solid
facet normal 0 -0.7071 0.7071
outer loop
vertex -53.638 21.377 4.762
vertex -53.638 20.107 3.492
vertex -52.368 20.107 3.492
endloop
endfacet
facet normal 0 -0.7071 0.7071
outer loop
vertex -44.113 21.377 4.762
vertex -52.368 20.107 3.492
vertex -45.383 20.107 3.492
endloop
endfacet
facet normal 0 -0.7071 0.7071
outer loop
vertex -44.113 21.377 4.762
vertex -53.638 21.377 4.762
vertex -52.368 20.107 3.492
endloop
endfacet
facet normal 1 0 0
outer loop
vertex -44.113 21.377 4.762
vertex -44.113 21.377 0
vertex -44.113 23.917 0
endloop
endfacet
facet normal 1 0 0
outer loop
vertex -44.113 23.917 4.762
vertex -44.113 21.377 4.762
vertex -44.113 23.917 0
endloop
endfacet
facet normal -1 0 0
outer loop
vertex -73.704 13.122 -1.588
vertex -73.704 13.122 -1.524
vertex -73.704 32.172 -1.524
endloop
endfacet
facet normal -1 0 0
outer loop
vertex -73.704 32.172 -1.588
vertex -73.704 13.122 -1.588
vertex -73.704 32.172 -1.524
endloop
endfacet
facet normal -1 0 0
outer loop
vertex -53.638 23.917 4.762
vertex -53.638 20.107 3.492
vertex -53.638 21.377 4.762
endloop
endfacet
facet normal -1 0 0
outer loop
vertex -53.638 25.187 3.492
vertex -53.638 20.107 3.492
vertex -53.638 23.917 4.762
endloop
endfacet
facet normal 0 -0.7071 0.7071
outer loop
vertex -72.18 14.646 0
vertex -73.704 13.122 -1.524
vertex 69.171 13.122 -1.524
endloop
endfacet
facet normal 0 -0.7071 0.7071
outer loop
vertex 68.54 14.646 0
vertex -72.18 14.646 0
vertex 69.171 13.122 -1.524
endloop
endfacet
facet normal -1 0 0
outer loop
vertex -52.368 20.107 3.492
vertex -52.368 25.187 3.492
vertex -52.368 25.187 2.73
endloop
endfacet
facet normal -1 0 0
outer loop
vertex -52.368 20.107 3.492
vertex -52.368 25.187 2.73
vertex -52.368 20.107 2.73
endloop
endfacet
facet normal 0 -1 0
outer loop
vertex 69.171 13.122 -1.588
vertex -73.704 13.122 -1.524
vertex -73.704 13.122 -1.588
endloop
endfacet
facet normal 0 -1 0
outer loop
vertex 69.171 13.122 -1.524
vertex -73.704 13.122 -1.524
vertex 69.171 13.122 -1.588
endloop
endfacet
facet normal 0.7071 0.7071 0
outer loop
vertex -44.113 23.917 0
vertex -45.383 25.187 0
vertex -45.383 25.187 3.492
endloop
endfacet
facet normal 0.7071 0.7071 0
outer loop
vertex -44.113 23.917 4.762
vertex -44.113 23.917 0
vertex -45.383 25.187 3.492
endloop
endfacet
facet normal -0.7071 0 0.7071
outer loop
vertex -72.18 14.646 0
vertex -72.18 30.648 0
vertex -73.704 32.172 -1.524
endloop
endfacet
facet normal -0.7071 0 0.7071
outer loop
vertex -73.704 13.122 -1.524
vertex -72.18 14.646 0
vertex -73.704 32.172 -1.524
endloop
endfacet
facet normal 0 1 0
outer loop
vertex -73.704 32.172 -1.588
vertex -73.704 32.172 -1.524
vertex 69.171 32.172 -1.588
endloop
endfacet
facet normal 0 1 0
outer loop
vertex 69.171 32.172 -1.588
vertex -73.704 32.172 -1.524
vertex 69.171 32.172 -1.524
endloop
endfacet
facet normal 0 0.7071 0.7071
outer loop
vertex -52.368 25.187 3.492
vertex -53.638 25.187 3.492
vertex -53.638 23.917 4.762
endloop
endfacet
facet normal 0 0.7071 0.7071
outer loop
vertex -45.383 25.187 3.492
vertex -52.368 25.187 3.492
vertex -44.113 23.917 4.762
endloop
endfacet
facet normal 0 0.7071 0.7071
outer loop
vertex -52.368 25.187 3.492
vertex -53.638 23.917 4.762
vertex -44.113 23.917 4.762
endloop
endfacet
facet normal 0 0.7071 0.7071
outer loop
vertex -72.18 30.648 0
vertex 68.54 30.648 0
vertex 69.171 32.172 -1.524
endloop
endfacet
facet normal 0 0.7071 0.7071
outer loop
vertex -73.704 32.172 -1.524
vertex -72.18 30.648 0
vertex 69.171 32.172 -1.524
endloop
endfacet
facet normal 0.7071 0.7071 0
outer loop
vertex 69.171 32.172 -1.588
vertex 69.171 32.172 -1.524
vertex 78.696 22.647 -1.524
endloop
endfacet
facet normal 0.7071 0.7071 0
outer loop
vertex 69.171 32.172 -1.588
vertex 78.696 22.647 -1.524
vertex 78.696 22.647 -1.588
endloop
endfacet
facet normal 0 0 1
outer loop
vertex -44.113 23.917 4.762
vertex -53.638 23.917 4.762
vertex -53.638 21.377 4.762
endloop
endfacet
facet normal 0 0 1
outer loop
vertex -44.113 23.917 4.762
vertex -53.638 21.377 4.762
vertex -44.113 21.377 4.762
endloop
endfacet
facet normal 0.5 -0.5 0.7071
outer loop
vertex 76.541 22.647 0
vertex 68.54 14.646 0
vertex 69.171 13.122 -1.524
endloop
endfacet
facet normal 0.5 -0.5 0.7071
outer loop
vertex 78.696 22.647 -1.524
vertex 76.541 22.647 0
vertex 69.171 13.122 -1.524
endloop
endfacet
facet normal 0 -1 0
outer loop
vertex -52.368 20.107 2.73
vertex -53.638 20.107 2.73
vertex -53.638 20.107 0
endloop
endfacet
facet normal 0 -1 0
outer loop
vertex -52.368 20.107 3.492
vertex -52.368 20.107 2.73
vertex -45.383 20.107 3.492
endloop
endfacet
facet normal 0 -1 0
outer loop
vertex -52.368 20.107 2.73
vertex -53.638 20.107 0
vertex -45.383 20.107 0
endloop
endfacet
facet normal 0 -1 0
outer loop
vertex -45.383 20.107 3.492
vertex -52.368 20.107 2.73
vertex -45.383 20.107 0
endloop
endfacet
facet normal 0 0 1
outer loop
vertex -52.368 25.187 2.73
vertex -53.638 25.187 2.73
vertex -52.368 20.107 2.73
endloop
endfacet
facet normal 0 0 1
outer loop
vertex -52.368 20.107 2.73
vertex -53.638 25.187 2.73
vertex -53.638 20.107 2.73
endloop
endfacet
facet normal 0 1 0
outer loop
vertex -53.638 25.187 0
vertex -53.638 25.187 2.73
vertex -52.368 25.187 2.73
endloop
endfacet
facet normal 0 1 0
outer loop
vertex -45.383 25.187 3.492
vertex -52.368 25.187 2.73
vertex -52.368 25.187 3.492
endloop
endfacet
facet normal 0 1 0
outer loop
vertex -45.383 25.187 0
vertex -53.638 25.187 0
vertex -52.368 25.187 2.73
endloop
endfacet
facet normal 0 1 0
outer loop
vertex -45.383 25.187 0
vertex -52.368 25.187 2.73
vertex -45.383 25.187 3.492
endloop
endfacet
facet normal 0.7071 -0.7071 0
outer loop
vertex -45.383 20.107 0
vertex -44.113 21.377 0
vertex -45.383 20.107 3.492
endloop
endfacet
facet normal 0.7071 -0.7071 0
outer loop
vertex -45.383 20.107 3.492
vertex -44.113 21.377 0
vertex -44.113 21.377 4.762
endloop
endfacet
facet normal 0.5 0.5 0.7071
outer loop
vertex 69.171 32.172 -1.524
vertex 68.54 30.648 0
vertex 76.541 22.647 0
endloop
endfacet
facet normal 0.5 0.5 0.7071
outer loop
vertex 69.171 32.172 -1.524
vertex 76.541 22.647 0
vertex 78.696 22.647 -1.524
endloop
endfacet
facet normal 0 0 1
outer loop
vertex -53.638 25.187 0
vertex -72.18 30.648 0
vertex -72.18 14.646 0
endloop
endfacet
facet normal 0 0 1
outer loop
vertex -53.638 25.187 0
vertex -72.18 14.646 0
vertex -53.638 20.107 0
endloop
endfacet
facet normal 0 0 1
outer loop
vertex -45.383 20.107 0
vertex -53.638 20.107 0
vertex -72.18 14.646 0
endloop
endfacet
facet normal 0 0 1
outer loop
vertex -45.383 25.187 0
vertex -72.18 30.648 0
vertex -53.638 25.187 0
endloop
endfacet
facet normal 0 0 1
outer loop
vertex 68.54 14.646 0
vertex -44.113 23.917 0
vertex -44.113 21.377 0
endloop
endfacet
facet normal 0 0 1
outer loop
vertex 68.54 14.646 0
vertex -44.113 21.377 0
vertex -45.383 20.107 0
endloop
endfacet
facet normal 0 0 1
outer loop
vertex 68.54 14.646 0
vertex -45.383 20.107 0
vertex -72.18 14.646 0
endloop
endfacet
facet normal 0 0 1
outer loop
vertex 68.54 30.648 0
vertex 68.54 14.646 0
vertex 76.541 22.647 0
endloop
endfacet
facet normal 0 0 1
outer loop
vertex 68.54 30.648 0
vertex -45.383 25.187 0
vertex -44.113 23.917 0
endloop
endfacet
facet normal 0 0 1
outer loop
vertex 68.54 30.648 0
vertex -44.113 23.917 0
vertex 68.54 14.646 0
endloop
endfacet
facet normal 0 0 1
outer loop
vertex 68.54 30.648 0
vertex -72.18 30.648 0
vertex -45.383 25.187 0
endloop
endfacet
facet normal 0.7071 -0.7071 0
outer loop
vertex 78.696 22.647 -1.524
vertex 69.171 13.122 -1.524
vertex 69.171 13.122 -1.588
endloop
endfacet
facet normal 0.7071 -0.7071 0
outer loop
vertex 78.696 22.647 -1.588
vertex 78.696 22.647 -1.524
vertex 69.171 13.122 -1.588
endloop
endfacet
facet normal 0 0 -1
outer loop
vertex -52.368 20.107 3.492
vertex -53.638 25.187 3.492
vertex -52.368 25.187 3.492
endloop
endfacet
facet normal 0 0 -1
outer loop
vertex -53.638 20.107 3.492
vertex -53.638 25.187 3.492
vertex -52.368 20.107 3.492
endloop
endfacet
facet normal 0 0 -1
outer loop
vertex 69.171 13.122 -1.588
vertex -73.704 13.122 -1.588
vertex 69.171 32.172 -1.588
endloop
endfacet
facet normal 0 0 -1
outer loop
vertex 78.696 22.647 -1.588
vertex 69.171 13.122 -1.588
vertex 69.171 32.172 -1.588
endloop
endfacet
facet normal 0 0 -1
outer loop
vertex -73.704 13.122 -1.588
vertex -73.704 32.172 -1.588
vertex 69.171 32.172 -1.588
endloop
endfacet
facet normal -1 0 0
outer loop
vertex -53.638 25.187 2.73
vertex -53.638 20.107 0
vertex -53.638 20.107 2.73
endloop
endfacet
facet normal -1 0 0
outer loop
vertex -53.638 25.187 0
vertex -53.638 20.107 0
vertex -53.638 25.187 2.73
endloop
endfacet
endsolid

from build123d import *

# Parameters (mm, degrees)
F0_W         = 152.4
F0_H         = 19.05
F1_DEPTH     = 1.5875
F2_SIZE      = 9.52499
F3_W         = 9.525
F3_H         = 5.08
F4_DEPTH     = 4.7625
F5_SIZE      = 1.27
F6_W         = 5.08
F6_H         = 0.762
F7_DEPTH     = 1.27
F8_SIZE      = 1.524
F9_T1_DEPTH  = 19.1535983177
F9_T3_DEPTH  = 7.8385097473
F9_T5_DEPTH  = 21.3088597868
F9_T7_DEPTH  = 150.7134997473
F9_T9_DEPTH  = 25.3644897473
F9_T14_DEPTH = 9.4899593576
F9_T19_DEPTH = 9.4899593576
F9_T24_DEPTH = 9.4899593576
F9_T29_DEPTH = 9.4899593576


# Not quite as in the source:
# - a fillet or chamfer that OpenCascade refuses, or shapes differently, is made with other operations: its cross-section is extruded or revolved along the edge and cut away or added
# - two fillets or chamfers of one size are made in one step
# - a fillet or chamfer is up to 0.001 mm smaller than in the source, because OpenCascade refuses the exact size


with BuildPart() as f1:
    # F0 (on Top) → F1 (new body)
    with BuildSketch(Plane.XY):
        with Locations((2.4961568415, 22.6473969003)):
            Rectangle(F0_W, F0_H)
    extrude(amount=-F1_DEPTH)

    # F2 (size 9.525 in the source; OpenCascade refuses exactly that, so slightly less here)
    f2_edges = [f1.edges().sort_by_distance(p)[0] for p in [
        (78.696157, 13.122397, -0.79375),
        (78.696157, 32.172397, -0.79375),
    ]]
    chamfer(f2_edges, length=F2_SIZE)

    # F3 (on face) → F4 (join)
    with BuildSketch(Plane.XY):
        with Locations((-48.8753431585, 22.6473969003)):
            Rectangle(F3_W, F3_H)
    extrude(amount=F4_DEPTH)

    # F5
    f5_edges = [f1.edges().sort_by_distance(p)[0] for p in [
        (-44.112843, 20.107397, 2.38125),
        (-44.112843, 25.187397, 2.38125),
        (-48.875343, 25.187397, 4.7625),
        (-48.875343, 20.107397, 4.7625),
    ]]
    chamfer(f5_edges, length=F5_SIZE)

    # F6 (on face) → F7 (cut)
    with BuildSketch(Plane(origin=(-53.6378431585, 0, 0), x_dir=(0, -1, 0), z_dir=(-1, 0, 0))):
        with Locations((-22.6473969003, 3.1115)):
            Rectangle(F6_W, F6_H)
    extrude(amount=-F7_DEPTH, mode=Mode.SUBTRACT)

    # F8
    f8_edges = [f1.edges().sort_by_distance(p)[0] for p in [
        (-2.266338, 13.122397, 0),
    ]]
    chamfer(f8_edges, length=F8_SIZE)

    # F9: chamfer of 1.524 on 7 edges, made by hand

    # F9_s2 → F9_t1 (cut)
    with BuildSketch(Plane(origin=(53.4430964982, 53.4430964982, 0), x_dir=(0, 0, 1), z_dir=(-0.7071067812, -0.7071067812, 0))):
        Polygon((0, -38.1084653026), (-1.524, -39.6324653026), (0, -39.6324653026), align=None)
    extrude(amount=F9_T1_DEPTH, mode=Mode.SUBTRACT)

    # F9_s4 → F9_t3 (cut)
    with BuildSketch(Plane.XZ.offset(-26.566651774)):
        Polygon((77.1721568415, 0), (78.6961568415, -1.524), (78.6961568415, 0), align=None)
    extrude(amount=F9_T3_DEPTH, mode=Mode.SUBTRACT)

    # F9_s6 → F9_t5 (cut)
    with BuildSketch(Plane(origin=(30.7956995979, -30.7956995979, 0), x_dir=(0, 0, 1), z_dir=(-0.7071067812, 0.7071067812, 0))):
        Polygon((0, 70.1367211515), (-1.524, 71.6607211515), (0, 71.6607211515), align=None)
    extrude(amount=F9_T5_DEPTH, mode=Mode.SUBTRACT)

    # F9_s8 → F9_t7 (cut)
    with BuildSketch(Plane.YZ.offset(-77.6230880321)):
        Polygon((30.6483969003, 0), (32.1723969003, -1.524), (32.1723969003, 0), align=None)
    extrude(amount=F9_T7_DEPTH, mode=Mode.SUBTRACT)

    # F9_s10 → F9_t9 (cut)
    with BuildSketch(Plane.XZ.offset(-36.091641774)):
        Polygon((-72.1798431585, 0), (-73.7038431585, -1.524), (-73.7038431585, 0), align=None)
    extrude(amount=F9_T9_DEPTH, mode=Mode.SUBTRACT)


with BuildPart() as f9_tool12:
    # F9_s13 → F9_t14 (new body)
    with BuildSketch(Plane.XY.offset(3.9512296788)):
        Polygon((77.618526107, 21.5697561658), (78.6961568415, 24.1713869003), (78.6961568415, 22.6473869003), align=None)
    extrude(amount=-F9_T14_DEPTH)

    split(bisect_by=Plane(origin=(38.5860784208, 0, 38.5860784208), x_dir=(0, 1, 0), z_dir=(0.7071067812, 0, 0.7071067812)), keep=Keep.TOP)


with BuildPart() as f1_1:
    add(f1.part)

    # F9_t11: cut F9_tool12
    add(f9_tool12.part, mode=Mode.SUBTRACT)


with BuildPart() as f9_tool17:
    # F9_s18 → F9_t19 (new body)
    with BuildSketch(Plane.XY.offset(3.9512296788)):
        Polygon((77.618526107, 21.5697561658), (78.6961568415, 24.1713869003), (78.6961568415, 22.6473869003), align=None)
    extrude(amount=-F9_T19_DEPTH)

    split(bisect_by=Plane(origin=(13.473377118, -13.473377118, 19.0542326513), x_dir=(0.7071067812, 0.7071067812, 0), z_dir=(0.5, -0.5, 0.7071067812)), keep=Keep.TOP)


with BuildPart() as f1_2:
    add(f1_1.part)

    # F9_t16: cut F9_tool17
    add(f9_tool17.part, mode=Mode.SUBTRACT)


with BuildPart() as f9_tool22:
    # F9_s23 → F9_t24 (new body)
    with BuildSketch(Plane.XY.offset(3.9512296788)):
        Polygon((78.6961568415, 21.1234069003), (77.618526107, 23.7250376349), (78.6961568415, 22.6474069003), align=None)
    extrude(amount=-F9_T24_DEPTH)

    split(bisect_by=Plane(origin=(24.7970755682, 24.7970755682, 35.0683605757), x_dir=(-0.7071067812, 0.7071067812, 0), z_dir=(0.5, 0.5, 0.7071067812)), keep=Keep.TOP)


with BuildPart() as f1_3:
    add(f1_2.part)

    # F9_t21: cut F9_tool22
    add(f9_tool22.part, mode=Mode.SUBTRACT)


with BuildPart() as f9_tool27:
    # F9_s28 → F9_t29 (new body)
    with BuildSketch(Plane.XY.offset(3.9512296788)):
        Polygon((78.6961568415, 21.1234069003), (77.618526107, 23.7250376349), (78.6961568415, 22.6474069003), align=None)
    extrude(amount=-F9_T29_DEPTH)

    split(bisect_by=Plane(origin=(38.5860784208, 0, 38.5860784208), x_dir=(0, 1, 0), z_dir=(0.7071067812, 0, 0.7071067812)), keep=Keep.TOP)


with BuildPart() as f1_4:
    add(f1_3.part)

    # F9_t26: cut F9_tool27
    add(f9_tool27.part, mode=Mode.SUBTRACT)


solid = f1_4.part
